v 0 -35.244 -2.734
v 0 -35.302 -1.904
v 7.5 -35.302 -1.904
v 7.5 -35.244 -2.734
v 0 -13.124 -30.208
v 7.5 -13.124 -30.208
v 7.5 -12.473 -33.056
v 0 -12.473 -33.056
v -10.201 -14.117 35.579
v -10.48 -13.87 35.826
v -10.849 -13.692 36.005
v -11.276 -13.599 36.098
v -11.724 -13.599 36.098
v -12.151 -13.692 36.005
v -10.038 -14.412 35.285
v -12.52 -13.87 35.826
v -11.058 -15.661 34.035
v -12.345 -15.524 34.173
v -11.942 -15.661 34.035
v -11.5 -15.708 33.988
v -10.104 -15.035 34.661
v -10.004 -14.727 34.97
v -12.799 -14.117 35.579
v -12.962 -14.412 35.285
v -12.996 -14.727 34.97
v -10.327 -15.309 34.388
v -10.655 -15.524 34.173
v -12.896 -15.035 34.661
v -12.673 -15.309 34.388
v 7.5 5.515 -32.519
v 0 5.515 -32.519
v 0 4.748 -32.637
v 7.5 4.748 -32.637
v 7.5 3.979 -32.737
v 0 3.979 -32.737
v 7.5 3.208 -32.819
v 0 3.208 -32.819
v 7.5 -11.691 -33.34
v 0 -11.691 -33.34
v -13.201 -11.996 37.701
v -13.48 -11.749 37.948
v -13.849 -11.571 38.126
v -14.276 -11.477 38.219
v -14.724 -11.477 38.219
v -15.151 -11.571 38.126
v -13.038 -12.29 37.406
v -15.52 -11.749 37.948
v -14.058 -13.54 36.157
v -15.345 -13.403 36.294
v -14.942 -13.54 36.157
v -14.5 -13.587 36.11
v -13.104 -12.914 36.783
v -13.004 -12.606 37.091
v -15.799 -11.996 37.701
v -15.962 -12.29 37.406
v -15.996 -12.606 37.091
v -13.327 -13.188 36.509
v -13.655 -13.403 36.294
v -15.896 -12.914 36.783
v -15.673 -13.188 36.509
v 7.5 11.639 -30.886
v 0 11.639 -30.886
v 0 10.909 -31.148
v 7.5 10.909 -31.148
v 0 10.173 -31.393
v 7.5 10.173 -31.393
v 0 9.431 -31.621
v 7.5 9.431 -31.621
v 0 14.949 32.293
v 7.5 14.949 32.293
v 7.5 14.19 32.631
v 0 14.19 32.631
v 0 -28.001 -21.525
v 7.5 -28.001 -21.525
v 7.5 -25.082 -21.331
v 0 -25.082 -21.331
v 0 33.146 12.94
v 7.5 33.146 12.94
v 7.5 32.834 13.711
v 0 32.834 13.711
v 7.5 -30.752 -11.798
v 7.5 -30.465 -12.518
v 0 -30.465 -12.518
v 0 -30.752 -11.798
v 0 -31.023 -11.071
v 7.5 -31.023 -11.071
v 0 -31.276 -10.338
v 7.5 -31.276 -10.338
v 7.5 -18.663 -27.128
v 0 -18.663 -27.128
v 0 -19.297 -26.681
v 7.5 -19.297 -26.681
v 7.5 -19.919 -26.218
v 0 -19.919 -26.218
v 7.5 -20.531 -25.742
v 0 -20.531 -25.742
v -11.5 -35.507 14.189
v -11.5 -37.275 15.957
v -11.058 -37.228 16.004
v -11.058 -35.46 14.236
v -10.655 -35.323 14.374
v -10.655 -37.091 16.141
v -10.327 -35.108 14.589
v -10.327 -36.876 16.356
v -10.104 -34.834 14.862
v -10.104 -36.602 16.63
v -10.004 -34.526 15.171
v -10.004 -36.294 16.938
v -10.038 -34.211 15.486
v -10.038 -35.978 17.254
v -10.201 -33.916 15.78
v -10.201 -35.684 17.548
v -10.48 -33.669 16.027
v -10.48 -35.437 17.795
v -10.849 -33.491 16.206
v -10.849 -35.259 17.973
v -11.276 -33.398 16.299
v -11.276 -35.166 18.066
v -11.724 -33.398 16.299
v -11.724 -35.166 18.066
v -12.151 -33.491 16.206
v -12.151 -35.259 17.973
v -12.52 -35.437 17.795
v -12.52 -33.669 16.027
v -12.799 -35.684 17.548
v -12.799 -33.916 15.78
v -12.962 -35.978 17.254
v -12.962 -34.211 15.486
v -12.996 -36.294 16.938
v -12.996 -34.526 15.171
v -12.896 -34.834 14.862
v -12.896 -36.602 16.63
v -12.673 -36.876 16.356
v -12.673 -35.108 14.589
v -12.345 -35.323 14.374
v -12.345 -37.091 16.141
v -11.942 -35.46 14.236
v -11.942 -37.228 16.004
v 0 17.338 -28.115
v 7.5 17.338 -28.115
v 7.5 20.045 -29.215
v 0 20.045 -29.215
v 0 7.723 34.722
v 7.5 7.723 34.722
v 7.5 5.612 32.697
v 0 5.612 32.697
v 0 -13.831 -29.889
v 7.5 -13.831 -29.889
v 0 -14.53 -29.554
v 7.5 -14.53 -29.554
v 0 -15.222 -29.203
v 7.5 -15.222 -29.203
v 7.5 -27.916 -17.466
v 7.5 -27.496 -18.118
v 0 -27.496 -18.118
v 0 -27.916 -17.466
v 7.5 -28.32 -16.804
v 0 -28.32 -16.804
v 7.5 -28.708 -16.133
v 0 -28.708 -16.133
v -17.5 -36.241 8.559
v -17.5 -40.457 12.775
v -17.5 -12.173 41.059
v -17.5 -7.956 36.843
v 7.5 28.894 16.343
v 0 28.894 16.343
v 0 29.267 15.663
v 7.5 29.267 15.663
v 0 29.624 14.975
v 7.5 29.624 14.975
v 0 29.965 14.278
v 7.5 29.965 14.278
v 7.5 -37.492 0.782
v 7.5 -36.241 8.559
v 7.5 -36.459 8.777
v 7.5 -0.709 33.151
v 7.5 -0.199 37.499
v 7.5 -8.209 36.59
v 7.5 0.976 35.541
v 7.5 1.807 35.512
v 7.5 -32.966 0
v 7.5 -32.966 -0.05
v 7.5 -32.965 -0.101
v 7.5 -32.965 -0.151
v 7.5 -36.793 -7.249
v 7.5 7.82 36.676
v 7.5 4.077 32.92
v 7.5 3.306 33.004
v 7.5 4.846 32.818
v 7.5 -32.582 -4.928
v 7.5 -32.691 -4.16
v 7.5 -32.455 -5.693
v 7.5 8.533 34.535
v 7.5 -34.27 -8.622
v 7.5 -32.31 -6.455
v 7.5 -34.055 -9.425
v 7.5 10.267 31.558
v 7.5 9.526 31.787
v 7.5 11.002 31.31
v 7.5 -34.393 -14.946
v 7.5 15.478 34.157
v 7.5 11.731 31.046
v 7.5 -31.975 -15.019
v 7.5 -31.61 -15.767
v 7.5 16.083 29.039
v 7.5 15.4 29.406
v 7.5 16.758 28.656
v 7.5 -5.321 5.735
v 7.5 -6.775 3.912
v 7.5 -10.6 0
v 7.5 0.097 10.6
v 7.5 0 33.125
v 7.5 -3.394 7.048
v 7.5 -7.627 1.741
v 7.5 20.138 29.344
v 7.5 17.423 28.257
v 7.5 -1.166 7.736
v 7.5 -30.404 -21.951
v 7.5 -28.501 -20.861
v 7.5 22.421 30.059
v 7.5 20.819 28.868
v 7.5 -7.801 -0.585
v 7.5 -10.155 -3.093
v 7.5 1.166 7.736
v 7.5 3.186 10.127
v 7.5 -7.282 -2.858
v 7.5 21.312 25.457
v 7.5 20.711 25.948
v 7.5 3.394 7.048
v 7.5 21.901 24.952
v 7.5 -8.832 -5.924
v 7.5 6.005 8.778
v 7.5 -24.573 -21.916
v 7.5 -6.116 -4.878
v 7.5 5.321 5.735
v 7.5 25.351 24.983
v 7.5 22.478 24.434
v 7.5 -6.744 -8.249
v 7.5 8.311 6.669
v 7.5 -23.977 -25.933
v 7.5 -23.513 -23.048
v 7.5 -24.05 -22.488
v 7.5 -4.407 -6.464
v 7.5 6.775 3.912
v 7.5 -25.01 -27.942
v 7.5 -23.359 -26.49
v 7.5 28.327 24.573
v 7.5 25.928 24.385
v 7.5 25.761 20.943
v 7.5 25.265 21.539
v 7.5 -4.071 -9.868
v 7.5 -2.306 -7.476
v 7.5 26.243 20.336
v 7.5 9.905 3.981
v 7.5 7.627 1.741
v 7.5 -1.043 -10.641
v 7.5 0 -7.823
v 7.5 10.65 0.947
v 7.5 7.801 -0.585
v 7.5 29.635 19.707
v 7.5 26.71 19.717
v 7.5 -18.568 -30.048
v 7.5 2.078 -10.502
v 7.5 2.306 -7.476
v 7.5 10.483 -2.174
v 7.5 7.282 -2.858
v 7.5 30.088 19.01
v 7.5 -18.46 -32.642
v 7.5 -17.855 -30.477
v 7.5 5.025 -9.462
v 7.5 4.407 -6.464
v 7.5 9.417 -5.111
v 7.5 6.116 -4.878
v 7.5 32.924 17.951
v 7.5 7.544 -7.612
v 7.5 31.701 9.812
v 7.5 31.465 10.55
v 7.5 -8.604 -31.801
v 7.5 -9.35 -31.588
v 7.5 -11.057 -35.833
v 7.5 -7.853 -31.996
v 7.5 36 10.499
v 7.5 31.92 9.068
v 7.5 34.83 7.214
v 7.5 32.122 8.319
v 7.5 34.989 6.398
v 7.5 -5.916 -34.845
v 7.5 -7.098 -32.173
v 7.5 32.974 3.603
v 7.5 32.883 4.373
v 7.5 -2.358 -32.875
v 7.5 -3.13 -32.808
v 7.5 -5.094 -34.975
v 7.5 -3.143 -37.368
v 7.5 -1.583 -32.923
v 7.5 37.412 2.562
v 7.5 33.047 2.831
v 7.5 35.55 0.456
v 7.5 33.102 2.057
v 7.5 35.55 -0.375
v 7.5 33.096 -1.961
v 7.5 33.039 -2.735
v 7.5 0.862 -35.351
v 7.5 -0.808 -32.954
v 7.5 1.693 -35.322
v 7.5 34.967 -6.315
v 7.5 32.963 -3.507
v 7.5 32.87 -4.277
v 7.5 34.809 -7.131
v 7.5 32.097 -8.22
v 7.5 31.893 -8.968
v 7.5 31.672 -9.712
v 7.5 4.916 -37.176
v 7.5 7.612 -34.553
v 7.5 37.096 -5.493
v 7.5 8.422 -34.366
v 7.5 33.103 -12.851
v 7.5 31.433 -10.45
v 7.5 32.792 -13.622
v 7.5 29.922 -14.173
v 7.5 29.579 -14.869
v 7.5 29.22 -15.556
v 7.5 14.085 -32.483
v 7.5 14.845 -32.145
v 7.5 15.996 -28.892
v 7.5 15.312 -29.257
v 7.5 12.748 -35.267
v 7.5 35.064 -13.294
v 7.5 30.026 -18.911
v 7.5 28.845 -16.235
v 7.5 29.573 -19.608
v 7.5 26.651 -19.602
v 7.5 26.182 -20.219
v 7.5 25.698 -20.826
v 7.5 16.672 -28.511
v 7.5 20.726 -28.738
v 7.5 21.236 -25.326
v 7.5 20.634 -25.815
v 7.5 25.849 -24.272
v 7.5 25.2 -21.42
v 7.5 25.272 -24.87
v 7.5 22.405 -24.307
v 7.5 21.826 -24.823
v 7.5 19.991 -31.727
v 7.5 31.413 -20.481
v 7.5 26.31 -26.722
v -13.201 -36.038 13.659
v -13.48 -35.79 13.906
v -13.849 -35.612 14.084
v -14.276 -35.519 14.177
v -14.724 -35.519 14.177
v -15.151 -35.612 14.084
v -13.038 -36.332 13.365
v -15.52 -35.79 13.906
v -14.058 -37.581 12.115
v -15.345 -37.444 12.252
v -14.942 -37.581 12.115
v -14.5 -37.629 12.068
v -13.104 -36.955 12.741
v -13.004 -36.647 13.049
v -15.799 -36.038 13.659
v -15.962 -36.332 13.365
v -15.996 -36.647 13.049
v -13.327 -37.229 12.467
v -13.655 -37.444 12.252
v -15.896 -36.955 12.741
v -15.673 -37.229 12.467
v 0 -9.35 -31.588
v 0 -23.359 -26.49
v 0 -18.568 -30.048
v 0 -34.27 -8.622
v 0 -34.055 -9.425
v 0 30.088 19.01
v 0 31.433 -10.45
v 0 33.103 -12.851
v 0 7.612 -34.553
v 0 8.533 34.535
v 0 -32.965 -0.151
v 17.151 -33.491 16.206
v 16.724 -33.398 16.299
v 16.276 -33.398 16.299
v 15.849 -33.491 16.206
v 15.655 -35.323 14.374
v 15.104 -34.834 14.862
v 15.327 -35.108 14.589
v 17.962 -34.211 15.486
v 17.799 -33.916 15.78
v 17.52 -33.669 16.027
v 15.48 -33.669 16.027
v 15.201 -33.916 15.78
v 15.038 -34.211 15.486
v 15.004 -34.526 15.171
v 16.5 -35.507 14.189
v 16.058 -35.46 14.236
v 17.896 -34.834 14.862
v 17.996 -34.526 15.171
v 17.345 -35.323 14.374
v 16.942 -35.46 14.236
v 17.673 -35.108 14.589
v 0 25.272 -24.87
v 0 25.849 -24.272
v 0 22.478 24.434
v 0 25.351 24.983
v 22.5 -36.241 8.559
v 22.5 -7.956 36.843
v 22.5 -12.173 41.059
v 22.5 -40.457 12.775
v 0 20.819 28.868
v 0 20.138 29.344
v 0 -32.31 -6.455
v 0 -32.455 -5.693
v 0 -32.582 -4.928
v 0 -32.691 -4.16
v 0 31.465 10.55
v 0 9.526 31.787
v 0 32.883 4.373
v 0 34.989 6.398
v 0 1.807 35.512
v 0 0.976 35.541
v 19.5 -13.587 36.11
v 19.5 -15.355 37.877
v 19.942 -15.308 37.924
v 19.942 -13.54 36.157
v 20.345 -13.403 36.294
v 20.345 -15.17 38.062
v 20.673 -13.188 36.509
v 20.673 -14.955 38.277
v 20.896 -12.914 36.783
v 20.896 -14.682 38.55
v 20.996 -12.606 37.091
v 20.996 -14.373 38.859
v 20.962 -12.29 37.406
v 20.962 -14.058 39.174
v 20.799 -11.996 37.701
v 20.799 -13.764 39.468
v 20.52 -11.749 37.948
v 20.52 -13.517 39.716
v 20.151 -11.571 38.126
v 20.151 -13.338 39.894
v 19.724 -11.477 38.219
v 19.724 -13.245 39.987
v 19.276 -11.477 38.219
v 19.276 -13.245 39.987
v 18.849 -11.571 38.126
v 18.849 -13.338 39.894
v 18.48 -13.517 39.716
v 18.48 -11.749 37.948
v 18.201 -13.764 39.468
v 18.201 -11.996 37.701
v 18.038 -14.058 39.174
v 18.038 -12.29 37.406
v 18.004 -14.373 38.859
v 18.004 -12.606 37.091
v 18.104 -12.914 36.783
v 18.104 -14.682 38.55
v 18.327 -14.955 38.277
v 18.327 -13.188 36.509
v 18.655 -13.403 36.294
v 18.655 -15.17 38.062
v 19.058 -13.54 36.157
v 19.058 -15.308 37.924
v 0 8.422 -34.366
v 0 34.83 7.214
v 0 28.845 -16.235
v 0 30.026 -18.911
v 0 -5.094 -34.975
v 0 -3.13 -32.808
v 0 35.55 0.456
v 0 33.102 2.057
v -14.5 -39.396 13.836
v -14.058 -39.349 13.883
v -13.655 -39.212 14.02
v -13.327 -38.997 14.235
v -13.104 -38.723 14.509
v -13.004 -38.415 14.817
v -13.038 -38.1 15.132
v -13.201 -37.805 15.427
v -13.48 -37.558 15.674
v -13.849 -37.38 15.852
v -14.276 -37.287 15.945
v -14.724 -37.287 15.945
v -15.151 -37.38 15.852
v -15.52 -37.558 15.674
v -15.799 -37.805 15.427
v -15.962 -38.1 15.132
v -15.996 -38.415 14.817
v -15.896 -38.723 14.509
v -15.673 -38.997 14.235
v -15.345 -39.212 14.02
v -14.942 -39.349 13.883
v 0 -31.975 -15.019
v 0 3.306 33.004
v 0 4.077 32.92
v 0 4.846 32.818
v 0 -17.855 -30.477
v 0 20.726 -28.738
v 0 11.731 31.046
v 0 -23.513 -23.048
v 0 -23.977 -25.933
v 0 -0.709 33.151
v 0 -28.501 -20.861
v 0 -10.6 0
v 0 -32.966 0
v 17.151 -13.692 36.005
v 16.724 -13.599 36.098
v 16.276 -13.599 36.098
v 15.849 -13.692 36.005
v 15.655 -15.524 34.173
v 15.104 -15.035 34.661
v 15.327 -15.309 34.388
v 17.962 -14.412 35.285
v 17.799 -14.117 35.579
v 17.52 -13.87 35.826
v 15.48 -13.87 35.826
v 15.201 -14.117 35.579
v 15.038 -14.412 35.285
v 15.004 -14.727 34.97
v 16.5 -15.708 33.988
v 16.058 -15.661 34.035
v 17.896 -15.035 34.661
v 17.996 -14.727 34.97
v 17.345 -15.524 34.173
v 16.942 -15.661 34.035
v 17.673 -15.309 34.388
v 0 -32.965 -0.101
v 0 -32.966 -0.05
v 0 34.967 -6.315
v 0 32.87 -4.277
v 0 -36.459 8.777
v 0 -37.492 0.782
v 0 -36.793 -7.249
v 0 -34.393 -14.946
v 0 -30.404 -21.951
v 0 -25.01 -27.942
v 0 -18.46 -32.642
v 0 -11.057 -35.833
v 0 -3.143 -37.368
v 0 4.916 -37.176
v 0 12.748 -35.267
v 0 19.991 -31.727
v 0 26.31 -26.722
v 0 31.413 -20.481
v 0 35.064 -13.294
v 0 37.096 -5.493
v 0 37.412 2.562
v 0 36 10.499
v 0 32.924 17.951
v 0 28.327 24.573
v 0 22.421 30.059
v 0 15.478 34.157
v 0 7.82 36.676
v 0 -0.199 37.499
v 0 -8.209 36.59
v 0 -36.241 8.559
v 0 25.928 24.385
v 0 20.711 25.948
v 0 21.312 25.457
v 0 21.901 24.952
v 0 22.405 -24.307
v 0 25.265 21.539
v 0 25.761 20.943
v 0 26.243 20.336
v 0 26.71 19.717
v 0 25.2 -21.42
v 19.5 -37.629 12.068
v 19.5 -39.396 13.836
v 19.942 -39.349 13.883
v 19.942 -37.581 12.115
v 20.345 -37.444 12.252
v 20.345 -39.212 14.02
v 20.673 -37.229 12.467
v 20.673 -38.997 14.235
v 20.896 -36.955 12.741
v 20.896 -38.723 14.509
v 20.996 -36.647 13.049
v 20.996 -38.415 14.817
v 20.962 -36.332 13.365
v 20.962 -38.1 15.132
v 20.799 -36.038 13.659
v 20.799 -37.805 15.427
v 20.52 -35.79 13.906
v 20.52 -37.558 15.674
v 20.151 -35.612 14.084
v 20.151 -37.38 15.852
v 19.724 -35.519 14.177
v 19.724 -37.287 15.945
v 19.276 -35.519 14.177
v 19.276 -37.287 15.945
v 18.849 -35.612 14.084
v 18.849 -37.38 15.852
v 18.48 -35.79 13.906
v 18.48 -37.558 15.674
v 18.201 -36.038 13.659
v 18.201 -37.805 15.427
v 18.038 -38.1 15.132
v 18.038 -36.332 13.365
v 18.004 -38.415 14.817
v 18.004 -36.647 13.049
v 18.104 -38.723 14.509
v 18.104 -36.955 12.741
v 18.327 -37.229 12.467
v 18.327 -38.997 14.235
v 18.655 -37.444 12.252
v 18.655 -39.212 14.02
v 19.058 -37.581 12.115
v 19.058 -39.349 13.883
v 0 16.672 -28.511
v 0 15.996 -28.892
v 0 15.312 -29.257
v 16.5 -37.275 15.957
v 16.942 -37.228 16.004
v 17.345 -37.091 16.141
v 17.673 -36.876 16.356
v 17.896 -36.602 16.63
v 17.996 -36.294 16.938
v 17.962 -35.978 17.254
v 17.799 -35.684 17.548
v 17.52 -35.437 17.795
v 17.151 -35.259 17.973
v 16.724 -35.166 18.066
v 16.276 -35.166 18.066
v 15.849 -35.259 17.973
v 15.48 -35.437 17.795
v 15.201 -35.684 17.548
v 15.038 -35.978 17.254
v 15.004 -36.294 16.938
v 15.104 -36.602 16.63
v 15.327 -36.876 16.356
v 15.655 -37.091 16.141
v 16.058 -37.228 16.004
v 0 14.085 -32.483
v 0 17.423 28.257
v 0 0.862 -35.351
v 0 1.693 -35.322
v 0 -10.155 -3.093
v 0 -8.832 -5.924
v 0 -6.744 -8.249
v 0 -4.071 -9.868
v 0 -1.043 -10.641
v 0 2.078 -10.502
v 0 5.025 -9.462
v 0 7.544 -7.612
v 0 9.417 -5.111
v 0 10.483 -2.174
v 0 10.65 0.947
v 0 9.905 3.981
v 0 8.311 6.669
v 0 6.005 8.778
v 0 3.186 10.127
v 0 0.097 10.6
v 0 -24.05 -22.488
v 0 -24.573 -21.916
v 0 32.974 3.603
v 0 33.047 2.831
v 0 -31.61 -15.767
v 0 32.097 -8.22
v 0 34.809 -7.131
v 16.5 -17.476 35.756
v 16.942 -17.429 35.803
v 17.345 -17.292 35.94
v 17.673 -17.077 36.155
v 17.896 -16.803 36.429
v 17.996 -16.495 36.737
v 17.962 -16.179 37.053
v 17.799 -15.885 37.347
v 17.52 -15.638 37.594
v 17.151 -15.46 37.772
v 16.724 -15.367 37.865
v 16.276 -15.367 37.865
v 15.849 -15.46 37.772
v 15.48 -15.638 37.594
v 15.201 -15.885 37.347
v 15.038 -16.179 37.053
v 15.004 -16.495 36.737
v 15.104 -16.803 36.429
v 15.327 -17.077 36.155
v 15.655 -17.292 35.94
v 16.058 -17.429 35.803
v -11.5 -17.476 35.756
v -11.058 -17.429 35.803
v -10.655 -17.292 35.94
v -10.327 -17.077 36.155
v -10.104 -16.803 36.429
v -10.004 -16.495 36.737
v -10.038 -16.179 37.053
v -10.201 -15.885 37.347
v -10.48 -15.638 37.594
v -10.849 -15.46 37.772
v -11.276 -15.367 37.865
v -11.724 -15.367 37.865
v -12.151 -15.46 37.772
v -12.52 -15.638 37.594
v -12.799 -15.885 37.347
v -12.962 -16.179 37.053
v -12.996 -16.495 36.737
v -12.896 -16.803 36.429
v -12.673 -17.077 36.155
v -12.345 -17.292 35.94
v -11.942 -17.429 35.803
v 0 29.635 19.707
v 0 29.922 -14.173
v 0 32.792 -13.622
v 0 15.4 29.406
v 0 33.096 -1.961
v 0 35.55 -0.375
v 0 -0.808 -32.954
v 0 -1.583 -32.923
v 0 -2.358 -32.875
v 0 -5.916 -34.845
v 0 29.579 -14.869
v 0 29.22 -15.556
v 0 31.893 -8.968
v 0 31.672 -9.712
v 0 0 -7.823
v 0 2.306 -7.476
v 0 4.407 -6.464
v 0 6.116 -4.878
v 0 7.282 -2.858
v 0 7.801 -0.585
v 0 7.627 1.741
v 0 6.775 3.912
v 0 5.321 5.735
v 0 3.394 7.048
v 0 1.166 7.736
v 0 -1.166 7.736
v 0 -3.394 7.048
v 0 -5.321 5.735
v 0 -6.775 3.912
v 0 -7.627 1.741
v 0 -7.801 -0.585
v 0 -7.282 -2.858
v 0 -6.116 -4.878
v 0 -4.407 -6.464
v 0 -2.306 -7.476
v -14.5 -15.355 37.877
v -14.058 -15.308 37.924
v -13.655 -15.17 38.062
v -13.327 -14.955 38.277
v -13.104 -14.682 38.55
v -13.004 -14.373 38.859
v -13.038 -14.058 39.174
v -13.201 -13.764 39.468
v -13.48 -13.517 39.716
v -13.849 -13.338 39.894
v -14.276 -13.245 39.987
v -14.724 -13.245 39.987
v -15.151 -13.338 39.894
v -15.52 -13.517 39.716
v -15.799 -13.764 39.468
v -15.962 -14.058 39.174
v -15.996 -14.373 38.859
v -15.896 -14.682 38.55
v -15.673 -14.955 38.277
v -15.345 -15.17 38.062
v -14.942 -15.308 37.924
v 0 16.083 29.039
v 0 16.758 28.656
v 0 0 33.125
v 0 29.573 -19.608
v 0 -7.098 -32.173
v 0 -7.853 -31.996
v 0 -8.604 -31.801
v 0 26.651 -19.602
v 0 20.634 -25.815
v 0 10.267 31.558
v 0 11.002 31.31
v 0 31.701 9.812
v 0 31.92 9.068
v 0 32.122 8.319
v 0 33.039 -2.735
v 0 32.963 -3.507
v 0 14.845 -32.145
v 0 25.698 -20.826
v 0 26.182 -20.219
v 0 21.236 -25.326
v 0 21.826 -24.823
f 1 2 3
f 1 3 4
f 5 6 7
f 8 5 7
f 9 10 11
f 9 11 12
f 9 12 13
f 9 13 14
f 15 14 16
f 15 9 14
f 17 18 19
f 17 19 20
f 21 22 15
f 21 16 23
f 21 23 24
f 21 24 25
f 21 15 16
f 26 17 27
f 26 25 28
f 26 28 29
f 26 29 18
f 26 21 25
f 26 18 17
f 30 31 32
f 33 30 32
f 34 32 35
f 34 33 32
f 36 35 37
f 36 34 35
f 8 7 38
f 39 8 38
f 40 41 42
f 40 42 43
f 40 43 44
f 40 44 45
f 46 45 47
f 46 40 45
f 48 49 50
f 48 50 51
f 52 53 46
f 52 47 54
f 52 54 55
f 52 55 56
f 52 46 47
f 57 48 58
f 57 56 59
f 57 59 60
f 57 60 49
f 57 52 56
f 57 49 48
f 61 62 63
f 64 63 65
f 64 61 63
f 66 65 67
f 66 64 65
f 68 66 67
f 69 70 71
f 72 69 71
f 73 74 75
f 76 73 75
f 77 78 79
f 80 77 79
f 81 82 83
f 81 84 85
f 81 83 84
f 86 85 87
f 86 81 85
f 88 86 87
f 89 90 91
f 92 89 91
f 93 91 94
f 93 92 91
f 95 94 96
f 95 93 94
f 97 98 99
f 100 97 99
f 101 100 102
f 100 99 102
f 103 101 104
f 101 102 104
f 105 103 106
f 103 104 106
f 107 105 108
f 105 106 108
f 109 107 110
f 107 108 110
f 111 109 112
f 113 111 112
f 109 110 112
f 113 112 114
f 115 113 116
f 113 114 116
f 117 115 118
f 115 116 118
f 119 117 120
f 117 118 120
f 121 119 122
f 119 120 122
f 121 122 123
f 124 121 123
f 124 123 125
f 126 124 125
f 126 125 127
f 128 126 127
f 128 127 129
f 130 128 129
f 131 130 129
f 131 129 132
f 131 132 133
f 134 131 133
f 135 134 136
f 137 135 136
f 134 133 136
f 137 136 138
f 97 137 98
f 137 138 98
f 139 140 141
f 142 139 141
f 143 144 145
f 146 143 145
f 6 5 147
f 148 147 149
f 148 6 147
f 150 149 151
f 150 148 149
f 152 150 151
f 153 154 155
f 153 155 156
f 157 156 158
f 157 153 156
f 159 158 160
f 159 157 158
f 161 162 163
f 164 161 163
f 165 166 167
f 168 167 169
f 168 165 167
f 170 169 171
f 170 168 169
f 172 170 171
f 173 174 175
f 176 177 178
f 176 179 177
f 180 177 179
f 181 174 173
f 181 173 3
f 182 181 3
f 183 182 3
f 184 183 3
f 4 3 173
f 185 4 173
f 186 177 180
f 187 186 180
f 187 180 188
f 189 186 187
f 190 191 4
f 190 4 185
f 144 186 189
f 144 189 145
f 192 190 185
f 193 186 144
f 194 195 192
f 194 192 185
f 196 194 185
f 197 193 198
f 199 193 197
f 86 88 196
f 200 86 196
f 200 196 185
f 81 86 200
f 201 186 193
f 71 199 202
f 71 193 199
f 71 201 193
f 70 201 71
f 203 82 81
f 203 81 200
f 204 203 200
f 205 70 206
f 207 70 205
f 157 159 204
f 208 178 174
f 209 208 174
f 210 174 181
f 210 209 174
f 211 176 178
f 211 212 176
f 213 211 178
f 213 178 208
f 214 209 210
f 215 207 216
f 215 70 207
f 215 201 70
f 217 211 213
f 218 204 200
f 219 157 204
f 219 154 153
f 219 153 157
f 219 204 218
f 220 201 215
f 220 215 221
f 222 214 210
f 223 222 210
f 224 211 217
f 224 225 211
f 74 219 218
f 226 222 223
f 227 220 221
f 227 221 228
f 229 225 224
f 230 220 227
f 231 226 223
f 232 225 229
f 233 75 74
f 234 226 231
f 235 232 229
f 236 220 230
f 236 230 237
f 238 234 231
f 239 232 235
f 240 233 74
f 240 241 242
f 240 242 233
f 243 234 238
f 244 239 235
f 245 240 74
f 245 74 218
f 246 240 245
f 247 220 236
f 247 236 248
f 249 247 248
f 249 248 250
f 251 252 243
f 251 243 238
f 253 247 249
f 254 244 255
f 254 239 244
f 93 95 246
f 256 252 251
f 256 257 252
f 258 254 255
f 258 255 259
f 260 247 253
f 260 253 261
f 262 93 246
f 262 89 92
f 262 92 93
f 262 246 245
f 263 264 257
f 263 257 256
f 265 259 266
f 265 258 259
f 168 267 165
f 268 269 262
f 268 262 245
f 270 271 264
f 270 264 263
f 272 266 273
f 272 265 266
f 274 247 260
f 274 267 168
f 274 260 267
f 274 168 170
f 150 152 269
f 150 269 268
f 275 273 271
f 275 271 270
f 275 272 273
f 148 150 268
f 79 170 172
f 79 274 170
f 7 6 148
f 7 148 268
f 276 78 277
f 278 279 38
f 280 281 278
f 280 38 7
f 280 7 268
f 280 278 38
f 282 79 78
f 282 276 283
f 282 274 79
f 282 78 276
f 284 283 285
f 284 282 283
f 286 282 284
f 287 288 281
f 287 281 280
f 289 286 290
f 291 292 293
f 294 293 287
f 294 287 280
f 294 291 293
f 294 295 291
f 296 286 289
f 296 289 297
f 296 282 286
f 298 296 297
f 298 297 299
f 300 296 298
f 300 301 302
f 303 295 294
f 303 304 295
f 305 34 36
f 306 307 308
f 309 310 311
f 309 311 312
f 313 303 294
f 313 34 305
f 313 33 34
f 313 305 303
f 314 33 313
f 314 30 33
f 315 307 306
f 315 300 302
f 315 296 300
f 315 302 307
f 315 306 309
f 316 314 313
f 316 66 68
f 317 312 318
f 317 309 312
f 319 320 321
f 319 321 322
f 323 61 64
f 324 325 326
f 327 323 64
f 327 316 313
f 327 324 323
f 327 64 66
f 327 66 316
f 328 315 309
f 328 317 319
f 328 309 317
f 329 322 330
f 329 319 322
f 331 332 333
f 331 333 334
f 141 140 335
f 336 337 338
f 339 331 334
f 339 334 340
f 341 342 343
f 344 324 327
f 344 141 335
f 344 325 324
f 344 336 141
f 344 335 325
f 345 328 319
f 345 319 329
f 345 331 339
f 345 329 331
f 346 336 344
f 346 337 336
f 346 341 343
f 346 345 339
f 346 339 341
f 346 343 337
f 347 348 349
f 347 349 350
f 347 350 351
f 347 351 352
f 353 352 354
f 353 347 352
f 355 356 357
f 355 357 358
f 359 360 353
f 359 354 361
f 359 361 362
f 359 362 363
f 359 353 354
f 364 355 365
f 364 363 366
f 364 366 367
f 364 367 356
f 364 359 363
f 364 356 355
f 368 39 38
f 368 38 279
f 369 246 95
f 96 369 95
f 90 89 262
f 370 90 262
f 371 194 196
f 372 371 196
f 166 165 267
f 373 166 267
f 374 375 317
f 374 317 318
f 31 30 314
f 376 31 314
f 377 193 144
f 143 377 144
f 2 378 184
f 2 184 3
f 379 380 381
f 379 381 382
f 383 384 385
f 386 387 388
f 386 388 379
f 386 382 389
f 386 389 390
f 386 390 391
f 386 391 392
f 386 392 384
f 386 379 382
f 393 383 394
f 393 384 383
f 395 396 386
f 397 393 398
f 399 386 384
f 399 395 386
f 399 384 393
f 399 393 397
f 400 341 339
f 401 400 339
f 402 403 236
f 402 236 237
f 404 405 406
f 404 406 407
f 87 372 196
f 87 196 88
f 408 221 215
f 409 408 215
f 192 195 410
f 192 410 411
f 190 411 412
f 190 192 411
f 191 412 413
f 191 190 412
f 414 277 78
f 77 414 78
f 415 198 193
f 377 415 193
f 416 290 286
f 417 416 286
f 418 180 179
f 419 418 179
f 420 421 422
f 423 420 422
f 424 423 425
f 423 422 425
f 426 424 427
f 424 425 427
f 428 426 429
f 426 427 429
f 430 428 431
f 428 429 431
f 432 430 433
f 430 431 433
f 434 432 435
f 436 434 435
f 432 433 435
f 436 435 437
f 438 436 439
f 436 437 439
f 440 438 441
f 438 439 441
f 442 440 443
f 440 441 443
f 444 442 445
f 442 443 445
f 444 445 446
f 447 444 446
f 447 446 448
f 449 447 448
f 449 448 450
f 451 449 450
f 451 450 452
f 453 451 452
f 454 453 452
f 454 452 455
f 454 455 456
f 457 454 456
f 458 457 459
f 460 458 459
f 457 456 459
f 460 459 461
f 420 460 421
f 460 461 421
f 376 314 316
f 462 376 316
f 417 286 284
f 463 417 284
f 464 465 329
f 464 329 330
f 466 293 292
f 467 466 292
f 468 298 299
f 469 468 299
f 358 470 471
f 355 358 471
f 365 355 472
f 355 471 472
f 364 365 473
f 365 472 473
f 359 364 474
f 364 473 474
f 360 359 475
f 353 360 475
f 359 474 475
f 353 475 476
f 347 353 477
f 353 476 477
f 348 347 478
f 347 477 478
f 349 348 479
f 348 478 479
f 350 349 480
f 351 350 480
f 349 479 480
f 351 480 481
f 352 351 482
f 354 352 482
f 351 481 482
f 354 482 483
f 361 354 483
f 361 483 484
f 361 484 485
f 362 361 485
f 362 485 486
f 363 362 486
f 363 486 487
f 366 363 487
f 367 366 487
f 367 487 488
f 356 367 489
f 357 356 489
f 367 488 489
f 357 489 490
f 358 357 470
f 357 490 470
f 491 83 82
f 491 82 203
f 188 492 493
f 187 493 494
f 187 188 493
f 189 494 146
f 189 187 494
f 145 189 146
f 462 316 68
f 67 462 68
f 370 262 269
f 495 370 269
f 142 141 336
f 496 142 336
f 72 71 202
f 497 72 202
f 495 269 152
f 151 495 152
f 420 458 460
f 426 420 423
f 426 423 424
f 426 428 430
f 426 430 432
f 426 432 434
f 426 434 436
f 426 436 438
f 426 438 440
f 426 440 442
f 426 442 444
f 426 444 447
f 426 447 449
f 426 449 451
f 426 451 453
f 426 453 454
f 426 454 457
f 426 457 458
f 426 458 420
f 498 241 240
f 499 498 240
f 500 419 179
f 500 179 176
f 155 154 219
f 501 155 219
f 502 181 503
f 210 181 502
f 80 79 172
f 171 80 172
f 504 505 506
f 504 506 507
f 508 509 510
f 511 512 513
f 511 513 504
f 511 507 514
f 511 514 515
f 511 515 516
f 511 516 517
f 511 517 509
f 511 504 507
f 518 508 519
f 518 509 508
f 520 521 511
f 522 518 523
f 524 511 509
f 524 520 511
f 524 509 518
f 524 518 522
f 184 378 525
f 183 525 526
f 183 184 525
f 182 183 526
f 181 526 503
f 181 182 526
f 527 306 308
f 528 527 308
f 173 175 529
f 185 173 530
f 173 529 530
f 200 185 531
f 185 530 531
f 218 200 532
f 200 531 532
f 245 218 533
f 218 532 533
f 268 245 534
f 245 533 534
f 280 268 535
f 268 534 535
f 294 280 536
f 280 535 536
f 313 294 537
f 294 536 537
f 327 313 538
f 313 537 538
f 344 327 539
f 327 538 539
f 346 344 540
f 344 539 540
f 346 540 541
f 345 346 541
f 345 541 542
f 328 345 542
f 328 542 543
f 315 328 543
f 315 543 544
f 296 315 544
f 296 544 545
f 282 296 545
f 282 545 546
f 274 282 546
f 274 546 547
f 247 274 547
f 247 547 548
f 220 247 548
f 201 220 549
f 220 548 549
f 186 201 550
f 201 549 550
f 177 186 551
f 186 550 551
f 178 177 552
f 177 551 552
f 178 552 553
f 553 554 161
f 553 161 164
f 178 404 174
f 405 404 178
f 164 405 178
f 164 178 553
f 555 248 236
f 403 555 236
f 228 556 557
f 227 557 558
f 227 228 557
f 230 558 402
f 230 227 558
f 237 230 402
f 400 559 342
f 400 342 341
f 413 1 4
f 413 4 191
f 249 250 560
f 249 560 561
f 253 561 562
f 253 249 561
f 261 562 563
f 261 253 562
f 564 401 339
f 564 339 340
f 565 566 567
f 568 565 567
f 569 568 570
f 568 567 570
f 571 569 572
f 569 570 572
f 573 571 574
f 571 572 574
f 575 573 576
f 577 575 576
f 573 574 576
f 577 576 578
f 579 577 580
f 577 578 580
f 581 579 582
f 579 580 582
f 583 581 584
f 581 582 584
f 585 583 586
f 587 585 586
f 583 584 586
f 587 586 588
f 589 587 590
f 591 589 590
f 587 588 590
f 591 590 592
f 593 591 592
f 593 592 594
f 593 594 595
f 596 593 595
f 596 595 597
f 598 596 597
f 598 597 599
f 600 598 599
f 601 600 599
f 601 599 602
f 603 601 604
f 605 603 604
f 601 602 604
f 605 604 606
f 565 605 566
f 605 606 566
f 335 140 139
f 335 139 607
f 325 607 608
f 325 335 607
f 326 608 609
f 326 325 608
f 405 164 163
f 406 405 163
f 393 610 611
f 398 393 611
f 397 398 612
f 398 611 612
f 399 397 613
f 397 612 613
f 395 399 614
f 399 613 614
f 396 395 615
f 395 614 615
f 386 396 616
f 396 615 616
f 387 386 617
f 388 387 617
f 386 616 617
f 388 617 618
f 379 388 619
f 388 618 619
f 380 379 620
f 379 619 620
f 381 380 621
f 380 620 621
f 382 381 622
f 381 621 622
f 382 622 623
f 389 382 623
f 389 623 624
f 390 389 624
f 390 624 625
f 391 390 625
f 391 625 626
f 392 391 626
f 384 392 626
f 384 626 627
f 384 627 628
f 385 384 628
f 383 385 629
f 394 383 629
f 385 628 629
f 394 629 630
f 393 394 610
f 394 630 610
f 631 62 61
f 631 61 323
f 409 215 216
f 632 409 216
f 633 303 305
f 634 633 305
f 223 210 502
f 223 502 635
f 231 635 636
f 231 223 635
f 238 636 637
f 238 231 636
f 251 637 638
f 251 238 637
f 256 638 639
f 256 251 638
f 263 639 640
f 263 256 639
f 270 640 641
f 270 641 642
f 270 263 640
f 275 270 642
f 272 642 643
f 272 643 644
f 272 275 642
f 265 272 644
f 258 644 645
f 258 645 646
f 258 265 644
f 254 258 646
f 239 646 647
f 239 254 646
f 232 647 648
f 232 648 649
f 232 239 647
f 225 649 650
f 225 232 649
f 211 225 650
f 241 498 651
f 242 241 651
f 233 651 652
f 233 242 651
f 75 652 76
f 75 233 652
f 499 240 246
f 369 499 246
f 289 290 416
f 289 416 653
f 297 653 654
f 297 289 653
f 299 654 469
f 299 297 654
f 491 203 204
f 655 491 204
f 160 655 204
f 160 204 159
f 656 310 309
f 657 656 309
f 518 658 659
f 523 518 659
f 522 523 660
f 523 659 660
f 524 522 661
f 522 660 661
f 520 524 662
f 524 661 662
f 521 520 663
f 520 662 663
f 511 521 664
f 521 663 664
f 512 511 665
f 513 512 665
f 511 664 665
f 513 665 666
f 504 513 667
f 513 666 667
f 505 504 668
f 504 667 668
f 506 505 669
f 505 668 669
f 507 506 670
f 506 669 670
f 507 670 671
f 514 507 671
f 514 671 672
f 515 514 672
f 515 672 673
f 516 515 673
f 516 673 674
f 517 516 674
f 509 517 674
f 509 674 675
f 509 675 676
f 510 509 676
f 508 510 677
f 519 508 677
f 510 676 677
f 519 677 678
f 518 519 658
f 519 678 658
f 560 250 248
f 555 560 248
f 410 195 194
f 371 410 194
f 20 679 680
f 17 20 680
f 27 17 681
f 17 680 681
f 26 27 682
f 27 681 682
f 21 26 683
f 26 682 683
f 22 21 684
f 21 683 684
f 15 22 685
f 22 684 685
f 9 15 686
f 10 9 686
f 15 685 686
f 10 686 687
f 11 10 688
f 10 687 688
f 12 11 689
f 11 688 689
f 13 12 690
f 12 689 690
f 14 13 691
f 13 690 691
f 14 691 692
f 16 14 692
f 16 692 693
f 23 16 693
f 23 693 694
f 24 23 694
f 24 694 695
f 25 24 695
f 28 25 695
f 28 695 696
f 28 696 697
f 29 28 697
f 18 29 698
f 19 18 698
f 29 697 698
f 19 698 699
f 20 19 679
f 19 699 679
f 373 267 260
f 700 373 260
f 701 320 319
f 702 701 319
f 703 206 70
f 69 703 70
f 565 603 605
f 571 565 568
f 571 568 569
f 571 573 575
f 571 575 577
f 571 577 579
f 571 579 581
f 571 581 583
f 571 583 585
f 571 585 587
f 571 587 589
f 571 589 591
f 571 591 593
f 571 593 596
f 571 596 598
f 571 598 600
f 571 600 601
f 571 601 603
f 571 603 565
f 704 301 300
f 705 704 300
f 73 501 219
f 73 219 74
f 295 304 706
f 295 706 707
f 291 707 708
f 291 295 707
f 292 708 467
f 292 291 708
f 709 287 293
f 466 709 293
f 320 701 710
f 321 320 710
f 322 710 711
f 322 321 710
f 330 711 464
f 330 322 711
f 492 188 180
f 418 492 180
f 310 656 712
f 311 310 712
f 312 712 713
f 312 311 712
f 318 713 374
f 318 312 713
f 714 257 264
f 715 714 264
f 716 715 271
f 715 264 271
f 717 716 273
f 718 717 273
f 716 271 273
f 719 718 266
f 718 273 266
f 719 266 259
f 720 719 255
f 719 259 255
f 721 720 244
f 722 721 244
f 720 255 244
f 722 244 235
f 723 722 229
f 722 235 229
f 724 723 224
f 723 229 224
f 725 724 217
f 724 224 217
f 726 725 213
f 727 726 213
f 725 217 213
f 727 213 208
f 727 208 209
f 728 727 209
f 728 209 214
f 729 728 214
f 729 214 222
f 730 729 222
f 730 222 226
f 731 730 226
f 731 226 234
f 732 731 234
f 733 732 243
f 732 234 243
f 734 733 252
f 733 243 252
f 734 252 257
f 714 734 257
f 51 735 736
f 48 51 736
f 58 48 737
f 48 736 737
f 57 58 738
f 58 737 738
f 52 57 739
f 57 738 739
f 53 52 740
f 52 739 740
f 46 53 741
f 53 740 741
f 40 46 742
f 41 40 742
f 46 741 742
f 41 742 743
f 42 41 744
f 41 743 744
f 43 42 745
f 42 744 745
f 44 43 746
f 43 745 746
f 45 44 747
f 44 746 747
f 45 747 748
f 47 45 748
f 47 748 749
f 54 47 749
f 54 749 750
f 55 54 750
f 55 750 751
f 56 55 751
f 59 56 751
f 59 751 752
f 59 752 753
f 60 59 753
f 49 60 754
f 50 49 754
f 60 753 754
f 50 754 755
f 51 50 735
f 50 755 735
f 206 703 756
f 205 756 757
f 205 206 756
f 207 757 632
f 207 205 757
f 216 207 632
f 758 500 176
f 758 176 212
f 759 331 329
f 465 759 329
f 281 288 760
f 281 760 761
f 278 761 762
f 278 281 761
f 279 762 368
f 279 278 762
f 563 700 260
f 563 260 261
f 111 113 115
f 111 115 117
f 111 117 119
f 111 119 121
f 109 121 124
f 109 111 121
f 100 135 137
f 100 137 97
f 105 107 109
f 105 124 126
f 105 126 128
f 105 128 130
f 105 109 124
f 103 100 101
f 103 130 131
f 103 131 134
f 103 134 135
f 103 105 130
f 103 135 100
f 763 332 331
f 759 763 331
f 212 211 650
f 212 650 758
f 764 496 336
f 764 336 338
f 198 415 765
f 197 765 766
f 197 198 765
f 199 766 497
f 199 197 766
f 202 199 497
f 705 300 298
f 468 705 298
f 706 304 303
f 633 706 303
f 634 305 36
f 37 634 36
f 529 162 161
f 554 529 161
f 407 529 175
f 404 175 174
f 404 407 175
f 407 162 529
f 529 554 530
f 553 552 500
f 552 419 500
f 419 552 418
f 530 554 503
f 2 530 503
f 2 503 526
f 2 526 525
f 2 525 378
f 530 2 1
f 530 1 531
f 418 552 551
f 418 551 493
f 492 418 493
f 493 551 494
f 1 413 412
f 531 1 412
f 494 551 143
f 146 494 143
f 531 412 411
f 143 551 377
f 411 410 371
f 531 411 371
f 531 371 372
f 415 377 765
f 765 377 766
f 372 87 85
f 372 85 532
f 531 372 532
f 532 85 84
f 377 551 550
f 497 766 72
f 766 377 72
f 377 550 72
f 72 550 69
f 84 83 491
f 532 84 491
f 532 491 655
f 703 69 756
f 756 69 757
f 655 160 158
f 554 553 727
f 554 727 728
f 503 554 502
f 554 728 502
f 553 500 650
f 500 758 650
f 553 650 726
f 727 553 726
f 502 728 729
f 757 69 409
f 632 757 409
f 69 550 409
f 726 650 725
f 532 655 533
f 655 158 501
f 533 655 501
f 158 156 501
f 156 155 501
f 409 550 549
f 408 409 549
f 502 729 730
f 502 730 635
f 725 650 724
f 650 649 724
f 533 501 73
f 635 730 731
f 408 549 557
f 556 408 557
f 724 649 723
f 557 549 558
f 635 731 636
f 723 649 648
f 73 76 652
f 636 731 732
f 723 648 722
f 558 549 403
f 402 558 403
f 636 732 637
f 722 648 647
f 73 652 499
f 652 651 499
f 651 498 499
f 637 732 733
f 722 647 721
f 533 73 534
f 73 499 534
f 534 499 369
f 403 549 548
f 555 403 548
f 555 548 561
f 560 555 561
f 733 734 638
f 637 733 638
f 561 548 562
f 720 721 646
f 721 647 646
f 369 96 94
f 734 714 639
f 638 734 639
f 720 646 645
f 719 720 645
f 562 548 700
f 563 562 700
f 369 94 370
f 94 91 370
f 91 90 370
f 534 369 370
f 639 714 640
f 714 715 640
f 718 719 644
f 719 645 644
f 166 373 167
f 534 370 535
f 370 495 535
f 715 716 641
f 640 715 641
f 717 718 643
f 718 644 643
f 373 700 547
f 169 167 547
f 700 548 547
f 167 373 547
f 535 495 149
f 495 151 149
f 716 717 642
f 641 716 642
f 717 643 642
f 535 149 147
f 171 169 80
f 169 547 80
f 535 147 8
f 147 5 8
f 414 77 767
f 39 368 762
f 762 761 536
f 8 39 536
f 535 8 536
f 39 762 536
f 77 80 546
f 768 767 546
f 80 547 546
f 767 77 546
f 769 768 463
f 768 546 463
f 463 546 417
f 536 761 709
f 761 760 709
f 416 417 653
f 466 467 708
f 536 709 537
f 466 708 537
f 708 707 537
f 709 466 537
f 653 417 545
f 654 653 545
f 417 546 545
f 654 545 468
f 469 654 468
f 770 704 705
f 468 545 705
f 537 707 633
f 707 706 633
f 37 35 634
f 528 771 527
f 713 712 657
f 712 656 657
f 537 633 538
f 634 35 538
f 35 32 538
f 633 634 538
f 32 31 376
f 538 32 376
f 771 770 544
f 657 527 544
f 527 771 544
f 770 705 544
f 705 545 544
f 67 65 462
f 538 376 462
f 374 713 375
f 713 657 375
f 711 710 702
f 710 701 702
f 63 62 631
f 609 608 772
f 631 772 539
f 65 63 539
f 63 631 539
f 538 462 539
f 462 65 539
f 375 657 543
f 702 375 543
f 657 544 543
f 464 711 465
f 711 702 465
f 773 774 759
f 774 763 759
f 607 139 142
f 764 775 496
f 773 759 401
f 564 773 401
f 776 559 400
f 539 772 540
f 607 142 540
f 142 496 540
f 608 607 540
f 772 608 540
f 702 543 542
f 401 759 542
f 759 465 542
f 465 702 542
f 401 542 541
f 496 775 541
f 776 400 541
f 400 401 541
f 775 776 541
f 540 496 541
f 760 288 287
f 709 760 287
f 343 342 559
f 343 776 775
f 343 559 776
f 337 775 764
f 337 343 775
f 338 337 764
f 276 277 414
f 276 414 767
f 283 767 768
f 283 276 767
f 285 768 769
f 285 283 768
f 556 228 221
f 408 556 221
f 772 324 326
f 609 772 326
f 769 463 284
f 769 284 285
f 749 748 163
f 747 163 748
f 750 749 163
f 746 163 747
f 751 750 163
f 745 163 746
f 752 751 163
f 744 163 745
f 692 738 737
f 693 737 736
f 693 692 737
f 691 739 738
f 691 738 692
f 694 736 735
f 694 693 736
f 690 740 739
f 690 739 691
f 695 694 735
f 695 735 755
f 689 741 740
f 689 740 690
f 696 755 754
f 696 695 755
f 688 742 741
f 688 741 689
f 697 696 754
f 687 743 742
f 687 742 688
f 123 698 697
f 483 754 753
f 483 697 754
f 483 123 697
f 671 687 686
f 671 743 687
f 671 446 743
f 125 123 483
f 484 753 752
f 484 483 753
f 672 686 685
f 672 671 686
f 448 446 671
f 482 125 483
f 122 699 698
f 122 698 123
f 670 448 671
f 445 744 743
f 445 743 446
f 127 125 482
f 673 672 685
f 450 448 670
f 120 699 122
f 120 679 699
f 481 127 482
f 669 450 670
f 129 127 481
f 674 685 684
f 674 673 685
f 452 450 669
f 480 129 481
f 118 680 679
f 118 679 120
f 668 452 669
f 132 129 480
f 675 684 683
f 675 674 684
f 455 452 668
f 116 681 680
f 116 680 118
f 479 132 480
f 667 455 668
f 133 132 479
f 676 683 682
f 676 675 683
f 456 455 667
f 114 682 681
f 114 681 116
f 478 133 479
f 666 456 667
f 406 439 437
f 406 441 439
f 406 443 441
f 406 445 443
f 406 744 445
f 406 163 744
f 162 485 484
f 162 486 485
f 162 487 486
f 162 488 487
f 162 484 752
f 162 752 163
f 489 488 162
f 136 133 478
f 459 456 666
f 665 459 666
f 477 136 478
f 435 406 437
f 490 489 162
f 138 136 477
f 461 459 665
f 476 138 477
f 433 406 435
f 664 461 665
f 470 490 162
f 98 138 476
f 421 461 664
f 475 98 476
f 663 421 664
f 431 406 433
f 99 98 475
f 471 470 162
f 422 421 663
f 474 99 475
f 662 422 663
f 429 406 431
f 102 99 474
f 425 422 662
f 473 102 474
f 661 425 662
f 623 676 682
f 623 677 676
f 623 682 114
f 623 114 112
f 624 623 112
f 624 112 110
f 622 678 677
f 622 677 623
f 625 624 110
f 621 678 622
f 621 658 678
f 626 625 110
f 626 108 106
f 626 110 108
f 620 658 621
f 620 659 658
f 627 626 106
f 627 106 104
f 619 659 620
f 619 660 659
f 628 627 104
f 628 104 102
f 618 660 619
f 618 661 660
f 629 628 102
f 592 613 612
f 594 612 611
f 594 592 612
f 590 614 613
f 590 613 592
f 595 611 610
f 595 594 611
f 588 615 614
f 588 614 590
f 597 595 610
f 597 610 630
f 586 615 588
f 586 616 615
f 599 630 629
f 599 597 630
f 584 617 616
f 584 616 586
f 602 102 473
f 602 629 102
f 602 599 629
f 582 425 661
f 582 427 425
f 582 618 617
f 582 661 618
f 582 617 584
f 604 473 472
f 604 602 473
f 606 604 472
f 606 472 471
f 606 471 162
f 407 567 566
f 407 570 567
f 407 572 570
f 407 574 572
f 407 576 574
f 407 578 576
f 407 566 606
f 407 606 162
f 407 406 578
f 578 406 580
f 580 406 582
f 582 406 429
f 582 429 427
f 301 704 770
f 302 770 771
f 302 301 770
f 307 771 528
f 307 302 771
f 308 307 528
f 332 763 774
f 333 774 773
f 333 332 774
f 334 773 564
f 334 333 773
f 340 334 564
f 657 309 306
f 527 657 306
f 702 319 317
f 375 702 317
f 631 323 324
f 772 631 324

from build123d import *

# Parameters (mm, degrees)
SKETCH1_R           = 50
BOSS_EXTRUDE2_DEPTH = 10
SKETCH7_R           = 10.430903113
CUT_EXTRUDE5_DEPTH  = 10
CUT_EXTRUDE8_DEPTH  = 72.414284285
CUT_EXTRUDE9_DEPTH  = 72.414284285
CIRPATTERN3_COUNT   = 9
CIRPATTERN3_ANGLE   = 88
CIRPATTERN4_COUNT   = 17
CIRPATTERN4_ANGLE   = 176
SCALE3_SCALE        = 0.75
BOSS_EXTRUDE3_DEPTH = 15
BOSS_EXTRUDE6_DEPTH = 25
SKETCH19_R          = 1.5
CUT_EXTRUDE10_DEPTH = 2.5


with BuildPart() as part:
    # Sketch1 → Boss-Extrude2 (new body)
    with BuildSketch(Plane.YZ):
        with Locations(Location((0, 0, 0), (0, 0, 270))):
            Circle(SKETCH1_R)
    extrude(amount=BOSS_EXTRUDE2_DEPTH)

    # Sketch7 → Cut-Extrude5 (cut)
    with BuildSketch(Plane.YZ.offset(10)):
        with Locations(Location((0, 0, 0), (0, 0, 270))):
            Circle(SKETCH7_R)
    extrude(amount=-CUT_EXTRUDE5_DEPTH, mode=Mode.SUBTRACT)

    # Sketch10 → Cut-Extrude8 (cut, through all)
    with BuildSketch(Plane.YZ.offset(10)):
        with BuildLine():
            Line((-43.954399928, 0), (-14.132830655, 0))
            ThreePointArc((-14.132830655, 0), (10.058249892, -10.149932648), (0.129658997, 14.132830655))
            Line((0.129658997, 14.132830655), (0, 44.213717922))
            ThreePointArc((0, 44.213717922), (31.393478761, -30.950795255), (-43.954399928, 0))
        make_face()
    extrude(amount=-CUT_EXTRUDE8_DEPTH, mode=Mode.SUBTRACT)

    # Sketch12 → Cut-Extrude9 (cut, through all)
    with BuildSketch(Plane.YZ.offset(10)):
        Polygon((47.400317311, 0), (47.400317311, 0.608013975), (44.136400392, 2.742660057), (44.128376975, -2.615132262), (47.400317311, -0.500577082), align=None)
    cut_extrude9 = extrude(amount=-CUT_EXTRUDE9_DEPTH, mode=Mode.SUBTRACT)

    # CirPattern3: Cut-Extrude9 ×9 about axis
    cirpattern3_axis = Axis((0, 0.129658997, 0.129658997), (1, 0, 0))
    for i in range(1, CIRPATTERN3_COUNT):
        add(cut_extrude9.rotate(cirpattern3_axis, i * CIRPATTERN3_ANGLE / (CIRPATTERN3_COUNT - 1)), mode=Mode.SUBTRACT)

    # CirPattern4: Cut-Extrude9 ×17 about axis
    cirpattern4_axis = Axis((0, 0.129658997, 0.129658997), (-1, 0, 0))
    for i in range(1, CIRPATTERN4_COUNT):
        add(cut_extrude9.rotate(cirpattern4_axis, i * CIRPATTERN4_ANGLE / (CIRPATTERN4_COUNT - 1)), mode=Mode.SUBTRACT)


with BuildPart() as part_1:
    # Scale3: scaled about (0, 0, 0)
    add(part.part.scale(SCALE3_SCALE))

    # Sketch15 → Boss-Extrude3 (add)
    with BuildSketch(Plane.YZ.offset(7.5)):
        Polygon((-12.172757091, 41.059305133), (-7.956454872, 36.843002914), (-36.24072612, 8.558731667), (-40.457028339, 12.775033886), align=None)
    extrude(amount=BOSS_EXTRUDE3_DEPTH)

    # Sketch20 → Boss-Extrude6 (add)
    with BuildSketch(Plane(origin=(7.5, 0, 0), x_dir=(0, -1, 0), z_dir=(-1, 0, 0))):
        Polygon((7.956454872, 36.843002914), (12.172757091, 41.059305133), (40.457028339, 12.775033886), (36.24072612, 8.558731667), align=None)
    extrude(amount=BOSS_EXTRUDE6_DEPTH)

    # Sketch19 → Cut-Extrude10 (cut)
    with BuildSketch(Plane(origin=(0, -26.616031112, 26.616031112), x_dir=(1, 0, 0), z_dir=(0, -0.7071067811865476, 0.7071067811865475))):
        with Locations(Location((-14.5, -16.574125994, 0), (0, 0, 270))):
            Circle(SKETCH19_R)
        with Locations(Location((-14.5, 17.425874006, 0), (0, 0, 270))):
            Circle(SKETCH19_R)
        with Locations(Location((-11.5, 14.425874006, 0), (0, 0, 270))):
            Circle(SKETCH19_R)
        with Locations(Location((-11.5, -13.574125994, 0), (0, 0, 270))):
            Circle(SKETCH19_R)
        with Locations(Location((19.5, 17.425874006, 0), (0, 0, 270))):
            Circle(SKETCH19_R)
        with Locations(Location((16.5, 14.425874006, 0), (0, 0, 270))):
            Circle(SKETCH19_R)
        with Locations(Location((16.5, -13.574125994, 0), (0, 0, 270))):
            Circle(SKETCH19_R)
        with Locations(Location((19.5, -16.574125994, 0), (0, 0, 270))):
            Circle(SKETCH19_R)
    extrude(amount=-CUT_EXTRUDE10_DEPTH, mode=Mode.SUBTRACT)


solid = part_1.part
